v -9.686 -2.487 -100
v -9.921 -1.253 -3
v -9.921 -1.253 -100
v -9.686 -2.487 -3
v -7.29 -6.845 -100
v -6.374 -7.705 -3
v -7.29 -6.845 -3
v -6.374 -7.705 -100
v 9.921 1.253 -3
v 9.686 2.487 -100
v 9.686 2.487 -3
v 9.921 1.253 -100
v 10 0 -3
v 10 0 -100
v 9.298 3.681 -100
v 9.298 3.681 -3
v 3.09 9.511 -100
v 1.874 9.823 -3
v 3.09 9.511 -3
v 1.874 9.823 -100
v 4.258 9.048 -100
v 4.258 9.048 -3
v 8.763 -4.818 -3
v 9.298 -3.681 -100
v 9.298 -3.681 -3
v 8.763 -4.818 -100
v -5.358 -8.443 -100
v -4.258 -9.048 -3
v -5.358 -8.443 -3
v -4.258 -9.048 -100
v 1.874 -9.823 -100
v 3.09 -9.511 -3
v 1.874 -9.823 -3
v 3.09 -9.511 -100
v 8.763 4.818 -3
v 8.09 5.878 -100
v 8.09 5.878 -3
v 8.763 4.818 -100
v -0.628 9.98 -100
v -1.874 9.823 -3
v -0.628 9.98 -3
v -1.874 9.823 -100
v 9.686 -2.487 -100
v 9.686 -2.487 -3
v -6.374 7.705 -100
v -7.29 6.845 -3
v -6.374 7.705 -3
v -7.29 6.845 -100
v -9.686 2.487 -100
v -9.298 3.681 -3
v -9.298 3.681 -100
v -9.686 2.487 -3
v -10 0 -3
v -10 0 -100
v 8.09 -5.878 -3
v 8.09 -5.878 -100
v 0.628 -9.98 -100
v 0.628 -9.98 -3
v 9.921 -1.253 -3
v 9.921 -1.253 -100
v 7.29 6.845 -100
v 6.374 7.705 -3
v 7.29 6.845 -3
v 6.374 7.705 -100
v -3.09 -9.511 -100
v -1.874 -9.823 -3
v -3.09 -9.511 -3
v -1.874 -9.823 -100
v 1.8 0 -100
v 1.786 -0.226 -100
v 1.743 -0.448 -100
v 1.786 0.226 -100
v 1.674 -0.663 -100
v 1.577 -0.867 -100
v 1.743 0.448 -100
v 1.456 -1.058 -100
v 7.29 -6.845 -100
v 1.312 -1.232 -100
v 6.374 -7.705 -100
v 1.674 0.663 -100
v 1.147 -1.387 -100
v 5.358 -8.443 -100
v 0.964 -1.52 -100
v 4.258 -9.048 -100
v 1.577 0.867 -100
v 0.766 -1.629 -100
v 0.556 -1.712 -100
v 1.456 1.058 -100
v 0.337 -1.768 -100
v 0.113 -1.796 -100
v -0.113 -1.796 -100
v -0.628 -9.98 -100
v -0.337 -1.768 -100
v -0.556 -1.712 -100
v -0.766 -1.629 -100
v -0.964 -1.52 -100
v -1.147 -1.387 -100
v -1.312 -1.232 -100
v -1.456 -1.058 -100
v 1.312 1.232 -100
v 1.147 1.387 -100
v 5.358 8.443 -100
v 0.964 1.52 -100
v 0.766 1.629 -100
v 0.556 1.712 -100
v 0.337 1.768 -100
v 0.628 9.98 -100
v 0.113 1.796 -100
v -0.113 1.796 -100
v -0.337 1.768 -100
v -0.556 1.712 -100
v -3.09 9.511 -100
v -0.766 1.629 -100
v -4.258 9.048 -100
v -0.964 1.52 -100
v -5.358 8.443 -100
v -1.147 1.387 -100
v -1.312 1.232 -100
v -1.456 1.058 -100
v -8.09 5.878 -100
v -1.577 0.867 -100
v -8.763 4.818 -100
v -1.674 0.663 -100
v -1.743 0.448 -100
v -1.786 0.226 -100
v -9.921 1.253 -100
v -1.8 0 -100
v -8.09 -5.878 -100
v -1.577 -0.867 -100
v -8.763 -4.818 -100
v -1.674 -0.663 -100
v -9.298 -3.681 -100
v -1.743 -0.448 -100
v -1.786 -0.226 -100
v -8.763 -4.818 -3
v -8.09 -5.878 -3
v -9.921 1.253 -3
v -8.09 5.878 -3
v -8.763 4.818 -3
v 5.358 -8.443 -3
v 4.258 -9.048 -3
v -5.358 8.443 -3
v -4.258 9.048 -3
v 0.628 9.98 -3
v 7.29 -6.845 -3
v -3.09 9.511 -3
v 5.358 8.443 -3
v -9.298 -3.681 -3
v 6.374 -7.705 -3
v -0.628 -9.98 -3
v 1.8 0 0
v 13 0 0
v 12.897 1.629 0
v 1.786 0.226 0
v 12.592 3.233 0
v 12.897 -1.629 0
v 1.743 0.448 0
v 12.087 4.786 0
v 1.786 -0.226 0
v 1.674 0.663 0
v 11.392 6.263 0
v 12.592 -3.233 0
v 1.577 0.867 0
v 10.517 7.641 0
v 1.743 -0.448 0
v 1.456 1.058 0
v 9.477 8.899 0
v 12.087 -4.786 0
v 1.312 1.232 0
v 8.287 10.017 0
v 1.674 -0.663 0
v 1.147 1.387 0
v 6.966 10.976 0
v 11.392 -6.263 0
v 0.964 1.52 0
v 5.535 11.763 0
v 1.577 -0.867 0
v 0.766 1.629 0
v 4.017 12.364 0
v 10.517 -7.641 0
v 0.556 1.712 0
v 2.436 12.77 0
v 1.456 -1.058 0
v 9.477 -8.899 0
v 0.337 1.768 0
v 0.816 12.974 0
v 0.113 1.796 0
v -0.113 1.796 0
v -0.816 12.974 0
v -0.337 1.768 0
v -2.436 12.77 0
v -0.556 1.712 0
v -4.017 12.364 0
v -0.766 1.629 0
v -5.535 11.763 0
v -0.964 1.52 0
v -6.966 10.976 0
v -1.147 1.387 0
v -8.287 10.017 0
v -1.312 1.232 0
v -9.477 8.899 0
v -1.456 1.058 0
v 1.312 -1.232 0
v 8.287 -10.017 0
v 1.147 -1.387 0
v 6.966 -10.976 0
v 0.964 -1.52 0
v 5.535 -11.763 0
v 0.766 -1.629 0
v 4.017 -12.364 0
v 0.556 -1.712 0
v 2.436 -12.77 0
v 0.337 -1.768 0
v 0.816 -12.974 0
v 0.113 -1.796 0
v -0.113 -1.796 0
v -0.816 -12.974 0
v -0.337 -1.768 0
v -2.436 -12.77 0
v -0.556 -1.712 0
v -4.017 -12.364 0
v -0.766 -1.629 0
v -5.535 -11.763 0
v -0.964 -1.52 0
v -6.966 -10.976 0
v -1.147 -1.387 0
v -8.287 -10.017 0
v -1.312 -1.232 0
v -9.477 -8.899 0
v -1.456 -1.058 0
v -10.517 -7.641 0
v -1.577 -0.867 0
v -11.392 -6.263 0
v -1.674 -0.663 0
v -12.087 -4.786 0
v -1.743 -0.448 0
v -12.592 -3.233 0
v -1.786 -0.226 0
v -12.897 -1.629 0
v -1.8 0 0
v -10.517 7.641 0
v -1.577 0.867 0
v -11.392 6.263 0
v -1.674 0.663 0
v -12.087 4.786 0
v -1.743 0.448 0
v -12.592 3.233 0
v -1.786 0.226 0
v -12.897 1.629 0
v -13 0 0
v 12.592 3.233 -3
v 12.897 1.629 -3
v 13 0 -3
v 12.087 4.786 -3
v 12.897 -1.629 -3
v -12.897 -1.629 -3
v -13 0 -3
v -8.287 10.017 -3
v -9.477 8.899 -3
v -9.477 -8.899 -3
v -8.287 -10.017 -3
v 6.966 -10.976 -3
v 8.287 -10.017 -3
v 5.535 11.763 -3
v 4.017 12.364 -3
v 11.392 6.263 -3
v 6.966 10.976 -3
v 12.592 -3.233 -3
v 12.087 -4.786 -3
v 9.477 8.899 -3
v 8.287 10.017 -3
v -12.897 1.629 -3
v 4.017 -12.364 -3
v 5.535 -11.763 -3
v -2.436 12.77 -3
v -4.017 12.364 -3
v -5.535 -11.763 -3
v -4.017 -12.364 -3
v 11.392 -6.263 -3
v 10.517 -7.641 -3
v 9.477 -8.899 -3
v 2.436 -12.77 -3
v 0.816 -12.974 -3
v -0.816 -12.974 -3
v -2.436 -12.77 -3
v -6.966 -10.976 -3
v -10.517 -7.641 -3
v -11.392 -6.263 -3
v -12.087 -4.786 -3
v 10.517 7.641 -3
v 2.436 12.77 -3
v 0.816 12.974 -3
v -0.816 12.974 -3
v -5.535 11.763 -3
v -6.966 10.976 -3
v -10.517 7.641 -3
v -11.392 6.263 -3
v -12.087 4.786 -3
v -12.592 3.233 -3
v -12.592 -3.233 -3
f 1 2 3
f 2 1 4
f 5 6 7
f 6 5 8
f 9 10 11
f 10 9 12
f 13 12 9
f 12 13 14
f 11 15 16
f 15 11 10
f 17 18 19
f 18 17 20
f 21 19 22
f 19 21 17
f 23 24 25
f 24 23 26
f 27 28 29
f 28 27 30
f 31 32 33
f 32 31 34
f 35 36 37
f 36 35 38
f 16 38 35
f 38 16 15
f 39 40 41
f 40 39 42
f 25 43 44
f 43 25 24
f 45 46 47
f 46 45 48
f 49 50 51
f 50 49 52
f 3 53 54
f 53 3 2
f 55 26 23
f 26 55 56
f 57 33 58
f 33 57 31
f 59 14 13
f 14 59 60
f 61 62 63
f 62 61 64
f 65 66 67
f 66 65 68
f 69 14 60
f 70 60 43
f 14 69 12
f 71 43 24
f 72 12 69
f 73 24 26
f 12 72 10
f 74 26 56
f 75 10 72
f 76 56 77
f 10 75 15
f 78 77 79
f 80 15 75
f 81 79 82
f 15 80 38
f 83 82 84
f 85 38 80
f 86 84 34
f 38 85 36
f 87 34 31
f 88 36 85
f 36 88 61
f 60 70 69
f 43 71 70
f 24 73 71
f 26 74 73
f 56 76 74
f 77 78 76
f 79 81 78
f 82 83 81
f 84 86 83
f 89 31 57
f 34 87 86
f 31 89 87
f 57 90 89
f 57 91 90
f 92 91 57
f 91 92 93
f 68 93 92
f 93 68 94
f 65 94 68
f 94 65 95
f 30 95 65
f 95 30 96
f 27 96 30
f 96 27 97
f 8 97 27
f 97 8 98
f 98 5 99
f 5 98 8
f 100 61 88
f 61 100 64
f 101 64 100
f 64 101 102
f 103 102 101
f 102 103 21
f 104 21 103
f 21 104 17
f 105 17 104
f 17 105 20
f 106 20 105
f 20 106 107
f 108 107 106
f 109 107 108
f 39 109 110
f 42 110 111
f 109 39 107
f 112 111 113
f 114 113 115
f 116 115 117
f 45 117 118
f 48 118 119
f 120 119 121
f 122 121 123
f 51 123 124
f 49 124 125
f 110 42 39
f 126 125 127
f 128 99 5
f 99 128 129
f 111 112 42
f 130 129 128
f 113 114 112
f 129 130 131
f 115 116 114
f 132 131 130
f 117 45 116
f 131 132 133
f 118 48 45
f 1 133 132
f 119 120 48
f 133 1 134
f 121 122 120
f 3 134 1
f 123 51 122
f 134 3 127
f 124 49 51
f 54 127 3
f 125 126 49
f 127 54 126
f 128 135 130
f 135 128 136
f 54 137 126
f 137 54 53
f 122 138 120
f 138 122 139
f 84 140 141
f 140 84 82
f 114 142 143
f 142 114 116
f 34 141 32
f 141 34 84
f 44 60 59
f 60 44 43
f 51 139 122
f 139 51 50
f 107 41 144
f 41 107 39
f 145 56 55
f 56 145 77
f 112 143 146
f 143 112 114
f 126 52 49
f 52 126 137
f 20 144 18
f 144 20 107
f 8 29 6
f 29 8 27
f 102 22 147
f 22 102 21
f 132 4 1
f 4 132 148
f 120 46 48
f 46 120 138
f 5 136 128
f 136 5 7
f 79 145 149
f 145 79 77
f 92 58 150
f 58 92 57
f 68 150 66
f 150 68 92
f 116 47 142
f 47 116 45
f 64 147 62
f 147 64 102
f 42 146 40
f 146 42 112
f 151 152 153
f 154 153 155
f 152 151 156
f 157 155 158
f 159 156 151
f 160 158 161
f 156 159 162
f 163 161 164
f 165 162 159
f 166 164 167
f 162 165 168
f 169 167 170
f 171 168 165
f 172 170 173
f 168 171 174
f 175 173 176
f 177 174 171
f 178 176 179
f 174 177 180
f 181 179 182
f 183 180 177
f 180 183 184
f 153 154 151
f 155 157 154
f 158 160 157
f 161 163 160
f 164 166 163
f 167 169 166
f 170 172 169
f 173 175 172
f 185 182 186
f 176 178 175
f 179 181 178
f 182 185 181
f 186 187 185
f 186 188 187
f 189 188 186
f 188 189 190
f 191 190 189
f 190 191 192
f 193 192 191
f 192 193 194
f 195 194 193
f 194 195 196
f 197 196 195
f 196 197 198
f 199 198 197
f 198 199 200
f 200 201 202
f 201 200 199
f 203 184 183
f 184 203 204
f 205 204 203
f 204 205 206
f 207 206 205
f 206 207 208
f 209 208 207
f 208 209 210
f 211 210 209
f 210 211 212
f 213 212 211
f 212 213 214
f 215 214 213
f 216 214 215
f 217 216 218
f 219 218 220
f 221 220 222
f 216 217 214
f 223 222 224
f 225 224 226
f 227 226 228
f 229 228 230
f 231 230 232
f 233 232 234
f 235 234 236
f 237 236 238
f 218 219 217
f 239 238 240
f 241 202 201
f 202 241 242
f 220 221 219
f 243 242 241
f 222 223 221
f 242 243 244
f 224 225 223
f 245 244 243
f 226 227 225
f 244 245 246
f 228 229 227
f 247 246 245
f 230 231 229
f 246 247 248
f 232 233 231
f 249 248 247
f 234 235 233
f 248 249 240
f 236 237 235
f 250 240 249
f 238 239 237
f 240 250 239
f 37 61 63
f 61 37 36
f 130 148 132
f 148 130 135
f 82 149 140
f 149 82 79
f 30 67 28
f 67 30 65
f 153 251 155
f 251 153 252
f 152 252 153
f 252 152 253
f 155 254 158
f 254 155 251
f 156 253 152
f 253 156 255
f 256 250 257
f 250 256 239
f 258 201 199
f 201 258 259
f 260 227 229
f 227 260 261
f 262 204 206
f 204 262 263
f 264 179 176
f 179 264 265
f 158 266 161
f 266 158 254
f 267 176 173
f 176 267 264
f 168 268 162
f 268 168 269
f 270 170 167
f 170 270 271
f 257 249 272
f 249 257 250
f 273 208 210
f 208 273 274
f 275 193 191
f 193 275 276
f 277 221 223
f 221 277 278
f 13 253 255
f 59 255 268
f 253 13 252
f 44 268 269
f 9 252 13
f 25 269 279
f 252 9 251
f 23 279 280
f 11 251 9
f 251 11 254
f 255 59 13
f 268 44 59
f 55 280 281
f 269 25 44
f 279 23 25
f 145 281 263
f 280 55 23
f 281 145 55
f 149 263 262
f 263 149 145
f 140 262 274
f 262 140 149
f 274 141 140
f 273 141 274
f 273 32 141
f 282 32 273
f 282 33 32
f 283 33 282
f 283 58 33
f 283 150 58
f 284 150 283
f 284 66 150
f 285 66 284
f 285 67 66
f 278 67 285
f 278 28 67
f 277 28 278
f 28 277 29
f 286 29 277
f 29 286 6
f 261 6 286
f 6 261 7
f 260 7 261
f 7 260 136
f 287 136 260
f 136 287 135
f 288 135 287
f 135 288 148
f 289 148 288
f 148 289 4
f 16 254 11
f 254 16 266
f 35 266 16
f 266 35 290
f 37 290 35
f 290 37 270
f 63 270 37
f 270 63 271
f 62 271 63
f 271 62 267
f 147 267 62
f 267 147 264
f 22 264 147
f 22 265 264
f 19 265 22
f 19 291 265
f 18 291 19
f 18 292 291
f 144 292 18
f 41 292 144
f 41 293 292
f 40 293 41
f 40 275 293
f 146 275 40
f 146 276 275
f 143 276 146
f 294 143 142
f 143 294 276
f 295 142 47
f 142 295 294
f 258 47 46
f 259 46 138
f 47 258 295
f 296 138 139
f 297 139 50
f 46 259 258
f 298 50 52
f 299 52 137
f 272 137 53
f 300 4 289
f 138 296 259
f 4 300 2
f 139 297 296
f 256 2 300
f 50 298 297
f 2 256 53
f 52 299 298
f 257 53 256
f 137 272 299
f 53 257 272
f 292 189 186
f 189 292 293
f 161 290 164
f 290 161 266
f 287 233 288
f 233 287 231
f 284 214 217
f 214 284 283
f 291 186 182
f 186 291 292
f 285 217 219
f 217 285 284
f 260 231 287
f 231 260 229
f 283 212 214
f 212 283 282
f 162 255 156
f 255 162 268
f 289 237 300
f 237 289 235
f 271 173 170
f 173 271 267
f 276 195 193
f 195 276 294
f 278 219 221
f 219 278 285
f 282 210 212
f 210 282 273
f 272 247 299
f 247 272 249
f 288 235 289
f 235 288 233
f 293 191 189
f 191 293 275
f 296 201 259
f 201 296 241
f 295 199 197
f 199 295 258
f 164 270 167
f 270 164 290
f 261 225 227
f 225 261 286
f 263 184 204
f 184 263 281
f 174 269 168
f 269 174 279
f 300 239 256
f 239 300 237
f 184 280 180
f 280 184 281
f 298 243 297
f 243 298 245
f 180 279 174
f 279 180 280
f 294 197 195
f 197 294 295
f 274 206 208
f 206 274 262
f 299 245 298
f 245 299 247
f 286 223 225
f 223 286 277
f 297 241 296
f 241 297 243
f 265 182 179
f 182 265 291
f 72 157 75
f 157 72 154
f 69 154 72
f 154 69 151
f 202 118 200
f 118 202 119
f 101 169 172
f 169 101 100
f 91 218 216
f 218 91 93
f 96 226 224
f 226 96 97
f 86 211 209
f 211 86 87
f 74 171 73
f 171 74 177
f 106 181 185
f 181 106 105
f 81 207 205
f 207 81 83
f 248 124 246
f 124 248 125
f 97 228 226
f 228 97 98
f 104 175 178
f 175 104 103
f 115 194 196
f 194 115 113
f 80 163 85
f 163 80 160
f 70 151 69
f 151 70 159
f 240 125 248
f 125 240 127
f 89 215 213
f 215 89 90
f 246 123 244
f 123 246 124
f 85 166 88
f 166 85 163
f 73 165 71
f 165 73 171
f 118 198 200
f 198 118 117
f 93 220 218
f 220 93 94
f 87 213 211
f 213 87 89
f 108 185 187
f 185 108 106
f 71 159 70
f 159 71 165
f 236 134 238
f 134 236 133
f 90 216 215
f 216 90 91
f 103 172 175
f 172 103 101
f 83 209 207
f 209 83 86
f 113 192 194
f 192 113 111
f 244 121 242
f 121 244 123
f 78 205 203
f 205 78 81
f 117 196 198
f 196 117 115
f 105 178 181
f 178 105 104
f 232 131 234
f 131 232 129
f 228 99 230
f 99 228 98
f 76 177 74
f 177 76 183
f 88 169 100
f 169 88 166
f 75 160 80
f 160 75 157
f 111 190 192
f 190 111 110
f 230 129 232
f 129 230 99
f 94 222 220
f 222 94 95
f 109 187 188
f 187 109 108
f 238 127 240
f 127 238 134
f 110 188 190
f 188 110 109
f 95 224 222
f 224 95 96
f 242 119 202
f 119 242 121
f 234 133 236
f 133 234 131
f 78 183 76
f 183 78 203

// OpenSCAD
$fn = 50;


difference() {
	union() {
		translate(v = [0, 0, -100.0000000000]) {
			cylinder(h = 100, r = 10.0000000000);
		}
		translate(v = [0, 0, -3.0000000000]) {
			cylinder(h = 3, r = 13.0000000000);
		}
	}
	union() {
		#translate(v = [0, 0, -100]) {
			cylinder(h = 100, r = 1.8000000000);
		}
	}
}
